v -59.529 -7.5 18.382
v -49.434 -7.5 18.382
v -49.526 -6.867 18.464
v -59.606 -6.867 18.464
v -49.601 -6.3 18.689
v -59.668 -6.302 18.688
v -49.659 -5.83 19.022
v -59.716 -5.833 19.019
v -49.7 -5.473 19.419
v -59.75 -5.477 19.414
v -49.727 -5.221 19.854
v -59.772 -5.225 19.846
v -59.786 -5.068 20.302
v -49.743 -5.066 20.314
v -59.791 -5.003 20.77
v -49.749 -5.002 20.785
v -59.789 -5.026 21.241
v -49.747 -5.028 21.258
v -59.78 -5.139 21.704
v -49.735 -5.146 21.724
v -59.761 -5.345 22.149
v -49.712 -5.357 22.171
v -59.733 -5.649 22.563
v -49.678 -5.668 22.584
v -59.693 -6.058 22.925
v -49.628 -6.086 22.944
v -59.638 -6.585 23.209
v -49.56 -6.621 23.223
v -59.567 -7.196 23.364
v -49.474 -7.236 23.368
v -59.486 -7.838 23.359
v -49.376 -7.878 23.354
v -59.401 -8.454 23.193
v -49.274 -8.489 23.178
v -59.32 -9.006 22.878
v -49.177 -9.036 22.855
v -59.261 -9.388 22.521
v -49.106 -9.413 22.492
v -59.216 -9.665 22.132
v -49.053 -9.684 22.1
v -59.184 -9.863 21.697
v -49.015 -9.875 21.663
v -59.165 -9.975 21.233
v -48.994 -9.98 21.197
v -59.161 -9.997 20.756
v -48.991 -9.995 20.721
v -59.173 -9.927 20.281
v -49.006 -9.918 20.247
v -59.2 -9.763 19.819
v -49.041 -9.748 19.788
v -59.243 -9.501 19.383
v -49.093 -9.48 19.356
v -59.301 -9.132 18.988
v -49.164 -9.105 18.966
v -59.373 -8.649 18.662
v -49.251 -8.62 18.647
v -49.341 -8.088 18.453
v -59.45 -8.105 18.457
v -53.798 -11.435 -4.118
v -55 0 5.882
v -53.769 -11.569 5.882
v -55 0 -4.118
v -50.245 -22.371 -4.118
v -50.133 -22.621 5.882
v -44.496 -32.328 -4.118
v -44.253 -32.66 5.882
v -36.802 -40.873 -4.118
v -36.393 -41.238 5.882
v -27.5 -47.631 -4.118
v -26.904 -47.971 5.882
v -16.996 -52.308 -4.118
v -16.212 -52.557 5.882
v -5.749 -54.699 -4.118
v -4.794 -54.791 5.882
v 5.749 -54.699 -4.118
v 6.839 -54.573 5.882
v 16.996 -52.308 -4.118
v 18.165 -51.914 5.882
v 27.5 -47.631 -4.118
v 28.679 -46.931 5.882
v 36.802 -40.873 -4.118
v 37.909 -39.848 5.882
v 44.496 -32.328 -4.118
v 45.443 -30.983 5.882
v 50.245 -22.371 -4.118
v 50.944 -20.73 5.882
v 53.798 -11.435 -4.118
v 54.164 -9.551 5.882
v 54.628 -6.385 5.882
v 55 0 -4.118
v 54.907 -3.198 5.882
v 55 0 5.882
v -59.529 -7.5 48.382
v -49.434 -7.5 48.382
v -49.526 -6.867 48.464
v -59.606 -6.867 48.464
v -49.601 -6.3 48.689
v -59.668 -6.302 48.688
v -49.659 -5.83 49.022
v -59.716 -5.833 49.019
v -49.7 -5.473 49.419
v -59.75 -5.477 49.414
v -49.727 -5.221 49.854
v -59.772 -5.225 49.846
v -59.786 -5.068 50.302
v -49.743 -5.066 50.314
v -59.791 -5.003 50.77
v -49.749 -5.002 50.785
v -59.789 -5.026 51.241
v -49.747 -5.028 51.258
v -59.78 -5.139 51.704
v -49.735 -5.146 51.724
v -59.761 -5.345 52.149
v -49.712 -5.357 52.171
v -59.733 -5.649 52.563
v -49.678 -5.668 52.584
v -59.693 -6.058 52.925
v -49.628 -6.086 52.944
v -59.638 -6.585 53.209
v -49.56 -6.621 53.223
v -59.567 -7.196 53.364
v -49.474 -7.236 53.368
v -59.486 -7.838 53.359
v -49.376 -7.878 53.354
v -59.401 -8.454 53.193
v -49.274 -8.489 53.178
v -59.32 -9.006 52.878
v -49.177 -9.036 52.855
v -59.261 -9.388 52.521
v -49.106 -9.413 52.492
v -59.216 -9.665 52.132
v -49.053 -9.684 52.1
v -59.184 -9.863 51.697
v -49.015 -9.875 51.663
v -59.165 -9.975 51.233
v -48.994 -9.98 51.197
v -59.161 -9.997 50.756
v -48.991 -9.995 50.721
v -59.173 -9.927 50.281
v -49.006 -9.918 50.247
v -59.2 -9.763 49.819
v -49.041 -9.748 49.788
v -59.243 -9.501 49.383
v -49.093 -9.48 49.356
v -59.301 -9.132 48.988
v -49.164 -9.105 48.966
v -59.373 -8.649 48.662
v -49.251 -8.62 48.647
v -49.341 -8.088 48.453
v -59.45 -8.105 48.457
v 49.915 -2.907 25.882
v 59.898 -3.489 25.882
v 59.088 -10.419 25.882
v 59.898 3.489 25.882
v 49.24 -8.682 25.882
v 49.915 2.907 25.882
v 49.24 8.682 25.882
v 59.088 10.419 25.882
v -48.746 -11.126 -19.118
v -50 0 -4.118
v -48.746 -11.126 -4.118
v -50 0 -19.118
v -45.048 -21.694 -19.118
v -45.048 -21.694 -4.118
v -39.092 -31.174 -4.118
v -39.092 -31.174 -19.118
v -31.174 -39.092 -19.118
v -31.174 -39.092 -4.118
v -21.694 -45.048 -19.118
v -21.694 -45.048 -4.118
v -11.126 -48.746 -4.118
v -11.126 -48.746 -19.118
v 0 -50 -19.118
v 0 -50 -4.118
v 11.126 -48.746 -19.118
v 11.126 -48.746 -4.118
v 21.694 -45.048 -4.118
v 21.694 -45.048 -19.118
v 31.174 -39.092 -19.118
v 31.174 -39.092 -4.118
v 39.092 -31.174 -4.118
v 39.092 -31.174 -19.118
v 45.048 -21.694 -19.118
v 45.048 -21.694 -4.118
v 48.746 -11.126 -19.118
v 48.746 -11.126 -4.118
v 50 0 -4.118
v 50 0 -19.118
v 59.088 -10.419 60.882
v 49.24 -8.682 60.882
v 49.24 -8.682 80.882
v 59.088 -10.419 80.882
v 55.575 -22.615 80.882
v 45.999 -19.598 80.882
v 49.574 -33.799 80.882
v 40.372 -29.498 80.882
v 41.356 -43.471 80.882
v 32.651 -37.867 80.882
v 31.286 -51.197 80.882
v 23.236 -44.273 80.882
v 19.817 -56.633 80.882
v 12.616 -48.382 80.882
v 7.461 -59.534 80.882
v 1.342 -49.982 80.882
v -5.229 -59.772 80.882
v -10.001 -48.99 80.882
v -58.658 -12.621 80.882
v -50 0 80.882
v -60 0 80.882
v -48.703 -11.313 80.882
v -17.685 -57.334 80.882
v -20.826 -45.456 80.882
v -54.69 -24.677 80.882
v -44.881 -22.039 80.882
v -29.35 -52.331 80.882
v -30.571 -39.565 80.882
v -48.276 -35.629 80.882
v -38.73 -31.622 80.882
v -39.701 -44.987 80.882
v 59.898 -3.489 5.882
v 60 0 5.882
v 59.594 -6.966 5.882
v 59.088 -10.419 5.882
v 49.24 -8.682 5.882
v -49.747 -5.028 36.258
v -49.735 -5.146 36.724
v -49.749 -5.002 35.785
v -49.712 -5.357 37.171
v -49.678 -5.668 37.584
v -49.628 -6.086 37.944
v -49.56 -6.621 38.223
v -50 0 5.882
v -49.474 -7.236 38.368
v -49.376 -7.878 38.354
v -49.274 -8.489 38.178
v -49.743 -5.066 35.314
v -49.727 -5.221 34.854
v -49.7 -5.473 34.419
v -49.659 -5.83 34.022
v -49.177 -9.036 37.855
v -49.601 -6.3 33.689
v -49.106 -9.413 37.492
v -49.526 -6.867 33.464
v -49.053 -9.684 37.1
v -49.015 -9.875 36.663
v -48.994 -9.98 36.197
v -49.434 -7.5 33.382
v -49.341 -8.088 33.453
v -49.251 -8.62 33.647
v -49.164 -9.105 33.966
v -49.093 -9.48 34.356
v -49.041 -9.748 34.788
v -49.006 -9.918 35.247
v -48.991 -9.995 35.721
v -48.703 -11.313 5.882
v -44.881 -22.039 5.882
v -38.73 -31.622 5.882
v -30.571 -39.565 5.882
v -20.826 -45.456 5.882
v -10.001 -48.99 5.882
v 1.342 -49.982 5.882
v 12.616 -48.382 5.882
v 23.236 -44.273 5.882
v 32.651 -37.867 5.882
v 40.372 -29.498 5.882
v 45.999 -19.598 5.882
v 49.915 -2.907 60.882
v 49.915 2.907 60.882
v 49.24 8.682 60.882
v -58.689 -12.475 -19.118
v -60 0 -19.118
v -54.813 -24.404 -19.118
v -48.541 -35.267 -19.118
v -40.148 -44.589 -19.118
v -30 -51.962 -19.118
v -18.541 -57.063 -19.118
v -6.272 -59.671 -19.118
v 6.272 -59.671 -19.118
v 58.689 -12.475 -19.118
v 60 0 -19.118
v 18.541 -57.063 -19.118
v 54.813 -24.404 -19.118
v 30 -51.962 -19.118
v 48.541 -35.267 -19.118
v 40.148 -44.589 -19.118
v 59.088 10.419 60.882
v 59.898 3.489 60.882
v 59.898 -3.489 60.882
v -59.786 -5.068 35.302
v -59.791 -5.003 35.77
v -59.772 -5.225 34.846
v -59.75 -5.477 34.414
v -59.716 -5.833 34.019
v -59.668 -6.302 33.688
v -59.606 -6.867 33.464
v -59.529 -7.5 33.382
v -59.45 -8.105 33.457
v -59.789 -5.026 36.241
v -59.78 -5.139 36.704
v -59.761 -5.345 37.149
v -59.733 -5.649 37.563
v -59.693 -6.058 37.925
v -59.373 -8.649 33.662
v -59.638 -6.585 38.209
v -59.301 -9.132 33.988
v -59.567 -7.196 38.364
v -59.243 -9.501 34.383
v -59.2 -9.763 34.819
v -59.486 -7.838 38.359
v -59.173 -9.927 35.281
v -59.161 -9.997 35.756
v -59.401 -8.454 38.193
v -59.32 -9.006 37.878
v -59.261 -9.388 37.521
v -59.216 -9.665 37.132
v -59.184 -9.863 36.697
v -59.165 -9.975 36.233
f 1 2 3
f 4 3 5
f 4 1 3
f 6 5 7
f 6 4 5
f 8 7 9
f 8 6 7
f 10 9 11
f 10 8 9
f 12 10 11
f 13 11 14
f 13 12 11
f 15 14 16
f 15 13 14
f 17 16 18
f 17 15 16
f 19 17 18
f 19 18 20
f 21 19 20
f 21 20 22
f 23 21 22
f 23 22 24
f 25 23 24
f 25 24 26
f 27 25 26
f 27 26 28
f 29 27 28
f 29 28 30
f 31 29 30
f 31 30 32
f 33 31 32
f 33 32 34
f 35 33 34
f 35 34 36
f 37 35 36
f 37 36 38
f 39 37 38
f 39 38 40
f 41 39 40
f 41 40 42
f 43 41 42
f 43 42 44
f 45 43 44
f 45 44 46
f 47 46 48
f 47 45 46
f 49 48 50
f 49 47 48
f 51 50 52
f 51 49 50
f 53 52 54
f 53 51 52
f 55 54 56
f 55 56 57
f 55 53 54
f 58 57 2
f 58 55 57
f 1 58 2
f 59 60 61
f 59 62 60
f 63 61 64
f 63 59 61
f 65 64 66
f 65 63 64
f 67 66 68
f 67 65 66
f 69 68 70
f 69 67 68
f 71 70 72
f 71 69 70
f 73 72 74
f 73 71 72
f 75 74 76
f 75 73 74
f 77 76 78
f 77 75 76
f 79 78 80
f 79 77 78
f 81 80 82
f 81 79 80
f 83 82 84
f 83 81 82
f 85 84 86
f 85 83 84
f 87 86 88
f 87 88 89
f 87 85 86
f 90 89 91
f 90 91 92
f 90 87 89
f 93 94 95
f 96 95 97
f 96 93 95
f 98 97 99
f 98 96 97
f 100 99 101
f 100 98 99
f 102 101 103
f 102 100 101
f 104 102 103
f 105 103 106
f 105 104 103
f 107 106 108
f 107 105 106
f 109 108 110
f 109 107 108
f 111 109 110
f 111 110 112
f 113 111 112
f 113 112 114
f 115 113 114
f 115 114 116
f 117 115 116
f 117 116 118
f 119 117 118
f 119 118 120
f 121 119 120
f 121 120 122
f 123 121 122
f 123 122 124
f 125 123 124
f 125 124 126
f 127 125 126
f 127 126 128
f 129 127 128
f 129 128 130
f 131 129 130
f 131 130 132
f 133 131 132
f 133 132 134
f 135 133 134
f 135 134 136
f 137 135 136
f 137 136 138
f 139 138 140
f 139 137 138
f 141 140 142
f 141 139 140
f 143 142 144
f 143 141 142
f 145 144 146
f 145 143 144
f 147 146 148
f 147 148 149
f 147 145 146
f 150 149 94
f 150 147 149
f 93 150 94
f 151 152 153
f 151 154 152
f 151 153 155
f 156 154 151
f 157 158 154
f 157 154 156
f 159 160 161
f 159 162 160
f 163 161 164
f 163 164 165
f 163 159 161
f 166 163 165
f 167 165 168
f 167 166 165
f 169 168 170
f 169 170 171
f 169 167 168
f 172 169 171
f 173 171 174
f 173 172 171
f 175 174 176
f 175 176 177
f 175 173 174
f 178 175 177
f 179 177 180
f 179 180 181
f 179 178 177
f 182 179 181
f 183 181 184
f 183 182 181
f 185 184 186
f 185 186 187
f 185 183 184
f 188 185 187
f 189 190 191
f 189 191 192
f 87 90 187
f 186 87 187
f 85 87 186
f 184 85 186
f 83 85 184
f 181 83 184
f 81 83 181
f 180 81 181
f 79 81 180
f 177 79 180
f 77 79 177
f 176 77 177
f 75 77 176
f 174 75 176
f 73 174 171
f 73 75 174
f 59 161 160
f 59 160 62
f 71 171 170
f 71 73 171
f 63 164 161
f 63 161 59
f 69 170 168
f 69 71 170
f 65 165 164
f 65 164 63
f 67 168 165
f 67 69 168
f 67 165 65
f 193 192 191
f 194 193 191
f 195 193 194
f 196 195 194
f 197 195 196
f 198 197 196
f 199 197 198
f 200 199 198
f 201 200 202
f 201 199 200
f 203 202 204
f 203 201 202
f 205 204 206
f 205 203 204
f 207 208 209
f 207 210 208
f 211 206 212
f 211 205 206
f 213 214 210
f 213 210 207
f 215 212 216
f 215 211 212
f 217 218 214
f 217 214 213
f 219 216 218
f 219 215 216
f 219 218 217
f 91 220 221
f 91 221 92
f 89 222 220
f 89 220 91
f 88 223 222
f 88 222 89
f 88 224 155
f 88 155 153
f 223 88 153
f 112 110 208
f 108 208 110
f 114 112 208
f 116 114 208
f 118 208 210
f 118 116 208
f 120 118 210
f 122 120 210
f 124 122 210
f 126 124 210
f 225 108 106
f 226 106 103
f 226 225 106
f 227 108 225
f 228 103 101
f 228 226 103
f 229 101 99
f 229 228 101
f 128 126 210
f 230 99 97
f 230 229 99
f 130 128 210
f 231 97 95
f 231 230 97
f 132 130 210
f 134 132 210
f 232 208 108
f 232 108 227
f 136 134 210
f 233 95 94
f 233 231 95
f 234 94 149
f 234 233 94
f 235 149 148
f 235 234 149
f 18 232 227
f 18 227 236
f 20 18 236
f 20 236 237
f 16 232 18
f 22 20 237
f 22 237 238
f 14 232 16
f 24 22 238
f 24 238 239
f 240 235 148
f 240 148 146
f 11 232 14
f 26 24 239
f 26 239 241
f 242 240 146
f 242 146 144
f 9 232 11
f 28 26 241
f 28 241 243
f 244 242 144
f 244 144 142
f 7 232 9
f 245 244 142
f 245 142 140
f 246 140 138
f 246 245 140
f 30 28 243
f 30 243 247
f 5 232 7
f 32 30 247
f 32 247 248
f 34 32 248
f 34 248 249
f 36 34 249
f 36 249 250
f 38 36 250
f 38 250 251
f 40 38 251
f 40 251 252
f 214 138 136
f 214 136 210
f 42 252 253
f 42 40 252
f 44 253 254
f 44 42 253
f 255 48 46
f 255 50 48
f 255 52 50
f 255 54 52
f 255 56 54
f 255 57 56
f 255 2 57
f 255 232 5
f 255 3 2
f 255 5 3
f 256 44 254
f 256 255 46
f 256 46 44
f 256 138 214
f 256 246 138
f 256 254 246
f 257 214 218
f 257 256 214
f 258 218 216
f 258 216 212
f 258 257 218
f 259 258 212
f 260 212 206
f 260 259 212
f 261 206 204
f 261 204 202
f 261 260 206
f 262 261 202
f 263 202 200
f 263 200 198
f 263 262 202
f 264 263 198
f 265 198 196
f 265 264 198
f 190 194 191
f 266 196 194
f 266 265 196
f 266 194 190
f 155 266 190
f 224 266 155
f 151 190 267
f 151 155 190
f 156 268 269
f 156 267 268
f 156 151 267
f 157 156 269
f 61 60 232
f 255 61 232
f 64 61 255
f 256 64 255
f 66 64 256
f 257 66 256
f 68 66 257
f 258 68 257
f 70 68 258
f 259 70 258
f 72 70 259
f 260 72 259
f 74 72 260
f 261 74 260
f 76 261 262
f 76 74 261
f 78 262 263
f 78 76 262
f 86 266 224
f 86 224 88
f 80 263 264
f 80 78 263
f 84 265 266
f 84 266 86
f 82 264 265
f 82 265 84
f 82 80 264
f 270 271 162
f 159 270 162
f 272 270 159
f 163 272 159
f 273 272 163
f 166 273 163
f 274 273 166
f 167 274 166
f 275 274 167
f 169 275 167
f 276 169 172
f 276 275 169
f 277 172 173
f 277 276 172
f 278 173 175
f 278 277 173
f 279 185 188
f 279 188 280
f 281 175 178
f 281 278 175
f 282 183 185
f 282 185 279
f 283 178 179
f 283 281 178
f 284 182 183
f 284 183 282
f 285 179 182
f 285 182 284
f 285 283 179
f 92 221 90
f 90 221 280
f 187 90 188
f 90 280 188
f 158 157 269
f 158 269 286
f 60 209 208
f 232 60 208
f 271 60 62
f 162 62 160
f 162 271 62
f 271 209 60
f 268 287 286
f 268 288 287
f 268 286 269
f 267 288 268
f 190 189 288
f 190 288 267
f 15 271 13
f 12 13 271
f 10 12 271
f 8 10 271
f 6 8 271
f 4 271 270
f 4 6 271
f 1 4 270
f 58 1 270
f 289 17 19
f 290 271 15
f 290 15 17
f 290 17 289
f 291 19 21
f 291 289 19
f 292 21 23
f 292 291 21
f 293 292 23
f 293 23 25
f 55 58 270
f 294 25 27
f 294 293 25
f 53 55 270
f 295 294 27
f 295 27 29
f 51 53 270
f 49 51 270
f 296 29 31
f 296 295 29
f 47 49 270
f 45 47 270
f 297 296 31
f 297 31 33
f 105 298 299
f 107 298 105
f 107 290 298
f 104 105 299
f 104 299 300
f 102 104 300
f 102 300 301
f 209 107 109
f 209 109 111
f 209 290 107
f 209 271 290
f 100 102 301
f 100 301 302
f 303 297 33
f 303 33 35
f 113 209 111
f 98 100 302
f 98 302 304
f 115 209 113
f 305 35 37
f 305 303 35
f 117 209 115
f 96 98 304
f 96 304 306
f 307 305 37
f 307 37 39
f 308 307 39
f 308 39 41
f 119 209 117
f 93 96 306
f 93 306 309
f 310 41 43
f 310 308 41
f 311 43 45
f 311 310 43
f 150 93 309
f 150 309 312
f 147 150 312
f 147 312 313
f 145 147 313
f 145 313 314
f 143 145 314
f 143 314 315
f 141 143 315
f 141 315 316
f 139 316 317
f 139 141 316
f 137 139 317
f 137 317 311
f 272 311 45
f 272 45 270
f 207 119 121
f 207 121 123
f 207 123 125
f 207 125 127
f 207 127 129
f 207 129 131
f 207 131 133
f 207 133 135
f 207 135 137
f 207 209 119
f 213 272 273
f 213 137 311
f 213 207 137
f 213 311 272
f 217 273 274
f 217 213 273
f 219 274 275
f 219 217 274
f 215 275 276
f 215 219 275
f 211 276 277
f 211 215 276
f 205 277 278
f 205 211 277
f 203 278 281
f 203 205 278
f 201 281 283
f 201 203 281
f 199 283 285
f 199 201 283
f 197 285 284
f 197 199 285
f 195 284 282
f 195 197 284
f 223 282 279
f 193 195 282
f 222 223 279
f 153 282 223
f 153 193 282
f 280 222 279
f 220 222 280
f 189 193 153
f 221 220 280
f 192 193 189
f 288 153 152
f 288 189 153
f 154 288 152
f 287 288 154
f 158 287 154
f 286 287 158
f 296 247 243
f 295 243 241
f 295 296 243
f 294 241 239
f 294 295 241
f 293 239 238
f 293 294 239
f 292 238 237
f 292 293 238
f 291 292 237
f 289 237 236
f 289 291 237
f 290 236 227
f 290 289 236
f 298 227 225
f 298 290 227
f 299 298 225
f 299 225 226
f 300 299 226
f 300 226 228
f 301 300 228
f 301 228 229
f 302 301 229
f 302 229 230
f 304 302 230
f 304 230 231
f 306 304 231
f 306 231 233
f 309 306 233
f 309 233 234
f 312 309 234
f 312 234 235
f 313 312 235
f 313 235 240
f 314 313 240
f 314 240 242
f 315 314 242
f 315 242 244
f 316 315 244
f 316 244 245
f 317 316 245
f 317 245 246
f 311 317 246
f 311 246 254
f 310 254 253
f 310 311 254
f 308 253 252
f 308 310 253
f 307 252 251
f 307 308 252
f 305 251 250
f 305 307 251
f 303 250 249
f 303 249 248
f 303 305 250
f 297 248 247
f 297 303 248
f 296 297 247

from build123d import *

# Parameters (mm, degrees)
REVOLVE1_ANGLE     = 180
SKETCH2_W          = 10
SKETCH2_H          = 35
REVOLVE2_ANGLE     = 10
SKETCH3_W          = 10
SKETCH3_H          = 20
CUT_REVOLVE1_ANGLE = 10
CUT_EXTRUDE2_REACH = 142
SKETCH5_R          = 2.5


with BuildPart() as part:
    # Sketch1 → Revolve1 (revolve)
    with BuildSketch(Plane(origin=(0, 0, 0), x_dir=(1, 0, 0), z_dir=(0, 1, 0))):
        Polygon((-60, 19.117647059), (-60, -80.882352941), (-50, -80.882352941), (-50, -5.882352941), (-55, -5.882352941), (-55, 4.117647059), (-50, 4.117647059), (-50, 19.117647059), align=None)
    revolve(axis=Axis((0, 0, -69.117647059), (0, 0, 1)), revolution_arc=REVOLVE1_ANGLE)

    # Sketch2 → Revolve2 (revolve)
    with BuildSketch(Plane(origin=(0, 0, 0), x_dir=(1, 0, 0), z_dir=(0, 1, 0))):
        with Locations((55, -43.382352941)):
            Rectangle(SKETCH2_W, SKETCH2_H)
    revolve(axis=Axis((0, 0, -76.274402341), (0, 0, 1)), revolution_arc=REVOLVE2_ANGLE)

    # Sketch3 → Cut-Revolve1 (revolve, cut)
    with BuildSketch(Plane(origin=(0, 0, 0), x_dir=(1, 0, 0), z_dir=(0, 1, 0))):
        with Locations((55, -70.882352941)):
            Rectangle(SKETCH3_W, SKETCH3_H)
        with Locations((55, -15.882352941)):
            Rectangle(SKETCH3_W, SKETCH3_H)
    revolve(axis=Axis((0, 0, -76.834720656), (0, 0, -1)), revolution_arc=CUT_REVOLVE1_ANGLE, mode=Mode.SUBTRACT)

    # Sketch5 → Cut-Extrude2 (cut, up to next)
    with BuildSketch(Plane(origin=(-80, 0, 0), x_dir=(0, 0, -1), z_dir=(1, 0, 0)), mode=Mode.PRIVATE) as cut_extrude2_sk1:
        with Locations((-35.882352941, -7.5)):
            Circle(SKETCH5_R)
    cut_extrude2_tool1 = extrude(cut_extrude2_sk1.sketch, amount=CUT_EXTRUDE2_REACH, mode=Mode.PRIVATE) & part.part
    add(cut_extrude2_tool1.solids().sort_by_distance((-80, -7.5, 35.882353))[0], mode=Mode.SUBTRACT)
    # Sketch5 → Cut-Extrude2 (cut, up to next)
    with BuildSketch(Plane(origin=(-80, 0, 0), x_dir=(0, 0, -1), z_dir=(1, 0, 0)), mode=Mode.PRIVATE) as cut_extrude2_sk2:
        with Locations((-50.882352941, -7.5)):
            Circle(SKETCH5_R)
    cut_extrude2_tool2 = extrude(cut_extrude2_sk2.sketch, amount=CUT_EXTRUDE2_REACH, mode=Mode.PRIVATE) & part.part
    add(cut_extrude2_tool2.solids().sort_by_distance((-80, -7.5, 50.882353))[0], mode=Mode.SUBTRACT)
    # Sketch5 → Cut-Extrude2 (cut, up to next)
    with BuildSketch(Plane(origin=(-80, 0, 0), x_dir=(0, 0, -1), z_dir=(1, 0, 0)), mode=Mode.PRIVATE) as cut_extrude2_sk3:
        with Locations((-20.882352941, -7.5)):
            Circle(SKETCH5_R)
    cut_extrude2_tool3 = extrude(cut_extrude2_sk3.sketch, amount=CUT_EXTRUDE2_REACH, mode=Mode.PRIVATE) & part.part
    add(cut_extrude2_tool3.solids().sort_by_distance((-80, -7.5, 20.882353))[0], mode=Mode.SUBTRACT)


solid = part.part
